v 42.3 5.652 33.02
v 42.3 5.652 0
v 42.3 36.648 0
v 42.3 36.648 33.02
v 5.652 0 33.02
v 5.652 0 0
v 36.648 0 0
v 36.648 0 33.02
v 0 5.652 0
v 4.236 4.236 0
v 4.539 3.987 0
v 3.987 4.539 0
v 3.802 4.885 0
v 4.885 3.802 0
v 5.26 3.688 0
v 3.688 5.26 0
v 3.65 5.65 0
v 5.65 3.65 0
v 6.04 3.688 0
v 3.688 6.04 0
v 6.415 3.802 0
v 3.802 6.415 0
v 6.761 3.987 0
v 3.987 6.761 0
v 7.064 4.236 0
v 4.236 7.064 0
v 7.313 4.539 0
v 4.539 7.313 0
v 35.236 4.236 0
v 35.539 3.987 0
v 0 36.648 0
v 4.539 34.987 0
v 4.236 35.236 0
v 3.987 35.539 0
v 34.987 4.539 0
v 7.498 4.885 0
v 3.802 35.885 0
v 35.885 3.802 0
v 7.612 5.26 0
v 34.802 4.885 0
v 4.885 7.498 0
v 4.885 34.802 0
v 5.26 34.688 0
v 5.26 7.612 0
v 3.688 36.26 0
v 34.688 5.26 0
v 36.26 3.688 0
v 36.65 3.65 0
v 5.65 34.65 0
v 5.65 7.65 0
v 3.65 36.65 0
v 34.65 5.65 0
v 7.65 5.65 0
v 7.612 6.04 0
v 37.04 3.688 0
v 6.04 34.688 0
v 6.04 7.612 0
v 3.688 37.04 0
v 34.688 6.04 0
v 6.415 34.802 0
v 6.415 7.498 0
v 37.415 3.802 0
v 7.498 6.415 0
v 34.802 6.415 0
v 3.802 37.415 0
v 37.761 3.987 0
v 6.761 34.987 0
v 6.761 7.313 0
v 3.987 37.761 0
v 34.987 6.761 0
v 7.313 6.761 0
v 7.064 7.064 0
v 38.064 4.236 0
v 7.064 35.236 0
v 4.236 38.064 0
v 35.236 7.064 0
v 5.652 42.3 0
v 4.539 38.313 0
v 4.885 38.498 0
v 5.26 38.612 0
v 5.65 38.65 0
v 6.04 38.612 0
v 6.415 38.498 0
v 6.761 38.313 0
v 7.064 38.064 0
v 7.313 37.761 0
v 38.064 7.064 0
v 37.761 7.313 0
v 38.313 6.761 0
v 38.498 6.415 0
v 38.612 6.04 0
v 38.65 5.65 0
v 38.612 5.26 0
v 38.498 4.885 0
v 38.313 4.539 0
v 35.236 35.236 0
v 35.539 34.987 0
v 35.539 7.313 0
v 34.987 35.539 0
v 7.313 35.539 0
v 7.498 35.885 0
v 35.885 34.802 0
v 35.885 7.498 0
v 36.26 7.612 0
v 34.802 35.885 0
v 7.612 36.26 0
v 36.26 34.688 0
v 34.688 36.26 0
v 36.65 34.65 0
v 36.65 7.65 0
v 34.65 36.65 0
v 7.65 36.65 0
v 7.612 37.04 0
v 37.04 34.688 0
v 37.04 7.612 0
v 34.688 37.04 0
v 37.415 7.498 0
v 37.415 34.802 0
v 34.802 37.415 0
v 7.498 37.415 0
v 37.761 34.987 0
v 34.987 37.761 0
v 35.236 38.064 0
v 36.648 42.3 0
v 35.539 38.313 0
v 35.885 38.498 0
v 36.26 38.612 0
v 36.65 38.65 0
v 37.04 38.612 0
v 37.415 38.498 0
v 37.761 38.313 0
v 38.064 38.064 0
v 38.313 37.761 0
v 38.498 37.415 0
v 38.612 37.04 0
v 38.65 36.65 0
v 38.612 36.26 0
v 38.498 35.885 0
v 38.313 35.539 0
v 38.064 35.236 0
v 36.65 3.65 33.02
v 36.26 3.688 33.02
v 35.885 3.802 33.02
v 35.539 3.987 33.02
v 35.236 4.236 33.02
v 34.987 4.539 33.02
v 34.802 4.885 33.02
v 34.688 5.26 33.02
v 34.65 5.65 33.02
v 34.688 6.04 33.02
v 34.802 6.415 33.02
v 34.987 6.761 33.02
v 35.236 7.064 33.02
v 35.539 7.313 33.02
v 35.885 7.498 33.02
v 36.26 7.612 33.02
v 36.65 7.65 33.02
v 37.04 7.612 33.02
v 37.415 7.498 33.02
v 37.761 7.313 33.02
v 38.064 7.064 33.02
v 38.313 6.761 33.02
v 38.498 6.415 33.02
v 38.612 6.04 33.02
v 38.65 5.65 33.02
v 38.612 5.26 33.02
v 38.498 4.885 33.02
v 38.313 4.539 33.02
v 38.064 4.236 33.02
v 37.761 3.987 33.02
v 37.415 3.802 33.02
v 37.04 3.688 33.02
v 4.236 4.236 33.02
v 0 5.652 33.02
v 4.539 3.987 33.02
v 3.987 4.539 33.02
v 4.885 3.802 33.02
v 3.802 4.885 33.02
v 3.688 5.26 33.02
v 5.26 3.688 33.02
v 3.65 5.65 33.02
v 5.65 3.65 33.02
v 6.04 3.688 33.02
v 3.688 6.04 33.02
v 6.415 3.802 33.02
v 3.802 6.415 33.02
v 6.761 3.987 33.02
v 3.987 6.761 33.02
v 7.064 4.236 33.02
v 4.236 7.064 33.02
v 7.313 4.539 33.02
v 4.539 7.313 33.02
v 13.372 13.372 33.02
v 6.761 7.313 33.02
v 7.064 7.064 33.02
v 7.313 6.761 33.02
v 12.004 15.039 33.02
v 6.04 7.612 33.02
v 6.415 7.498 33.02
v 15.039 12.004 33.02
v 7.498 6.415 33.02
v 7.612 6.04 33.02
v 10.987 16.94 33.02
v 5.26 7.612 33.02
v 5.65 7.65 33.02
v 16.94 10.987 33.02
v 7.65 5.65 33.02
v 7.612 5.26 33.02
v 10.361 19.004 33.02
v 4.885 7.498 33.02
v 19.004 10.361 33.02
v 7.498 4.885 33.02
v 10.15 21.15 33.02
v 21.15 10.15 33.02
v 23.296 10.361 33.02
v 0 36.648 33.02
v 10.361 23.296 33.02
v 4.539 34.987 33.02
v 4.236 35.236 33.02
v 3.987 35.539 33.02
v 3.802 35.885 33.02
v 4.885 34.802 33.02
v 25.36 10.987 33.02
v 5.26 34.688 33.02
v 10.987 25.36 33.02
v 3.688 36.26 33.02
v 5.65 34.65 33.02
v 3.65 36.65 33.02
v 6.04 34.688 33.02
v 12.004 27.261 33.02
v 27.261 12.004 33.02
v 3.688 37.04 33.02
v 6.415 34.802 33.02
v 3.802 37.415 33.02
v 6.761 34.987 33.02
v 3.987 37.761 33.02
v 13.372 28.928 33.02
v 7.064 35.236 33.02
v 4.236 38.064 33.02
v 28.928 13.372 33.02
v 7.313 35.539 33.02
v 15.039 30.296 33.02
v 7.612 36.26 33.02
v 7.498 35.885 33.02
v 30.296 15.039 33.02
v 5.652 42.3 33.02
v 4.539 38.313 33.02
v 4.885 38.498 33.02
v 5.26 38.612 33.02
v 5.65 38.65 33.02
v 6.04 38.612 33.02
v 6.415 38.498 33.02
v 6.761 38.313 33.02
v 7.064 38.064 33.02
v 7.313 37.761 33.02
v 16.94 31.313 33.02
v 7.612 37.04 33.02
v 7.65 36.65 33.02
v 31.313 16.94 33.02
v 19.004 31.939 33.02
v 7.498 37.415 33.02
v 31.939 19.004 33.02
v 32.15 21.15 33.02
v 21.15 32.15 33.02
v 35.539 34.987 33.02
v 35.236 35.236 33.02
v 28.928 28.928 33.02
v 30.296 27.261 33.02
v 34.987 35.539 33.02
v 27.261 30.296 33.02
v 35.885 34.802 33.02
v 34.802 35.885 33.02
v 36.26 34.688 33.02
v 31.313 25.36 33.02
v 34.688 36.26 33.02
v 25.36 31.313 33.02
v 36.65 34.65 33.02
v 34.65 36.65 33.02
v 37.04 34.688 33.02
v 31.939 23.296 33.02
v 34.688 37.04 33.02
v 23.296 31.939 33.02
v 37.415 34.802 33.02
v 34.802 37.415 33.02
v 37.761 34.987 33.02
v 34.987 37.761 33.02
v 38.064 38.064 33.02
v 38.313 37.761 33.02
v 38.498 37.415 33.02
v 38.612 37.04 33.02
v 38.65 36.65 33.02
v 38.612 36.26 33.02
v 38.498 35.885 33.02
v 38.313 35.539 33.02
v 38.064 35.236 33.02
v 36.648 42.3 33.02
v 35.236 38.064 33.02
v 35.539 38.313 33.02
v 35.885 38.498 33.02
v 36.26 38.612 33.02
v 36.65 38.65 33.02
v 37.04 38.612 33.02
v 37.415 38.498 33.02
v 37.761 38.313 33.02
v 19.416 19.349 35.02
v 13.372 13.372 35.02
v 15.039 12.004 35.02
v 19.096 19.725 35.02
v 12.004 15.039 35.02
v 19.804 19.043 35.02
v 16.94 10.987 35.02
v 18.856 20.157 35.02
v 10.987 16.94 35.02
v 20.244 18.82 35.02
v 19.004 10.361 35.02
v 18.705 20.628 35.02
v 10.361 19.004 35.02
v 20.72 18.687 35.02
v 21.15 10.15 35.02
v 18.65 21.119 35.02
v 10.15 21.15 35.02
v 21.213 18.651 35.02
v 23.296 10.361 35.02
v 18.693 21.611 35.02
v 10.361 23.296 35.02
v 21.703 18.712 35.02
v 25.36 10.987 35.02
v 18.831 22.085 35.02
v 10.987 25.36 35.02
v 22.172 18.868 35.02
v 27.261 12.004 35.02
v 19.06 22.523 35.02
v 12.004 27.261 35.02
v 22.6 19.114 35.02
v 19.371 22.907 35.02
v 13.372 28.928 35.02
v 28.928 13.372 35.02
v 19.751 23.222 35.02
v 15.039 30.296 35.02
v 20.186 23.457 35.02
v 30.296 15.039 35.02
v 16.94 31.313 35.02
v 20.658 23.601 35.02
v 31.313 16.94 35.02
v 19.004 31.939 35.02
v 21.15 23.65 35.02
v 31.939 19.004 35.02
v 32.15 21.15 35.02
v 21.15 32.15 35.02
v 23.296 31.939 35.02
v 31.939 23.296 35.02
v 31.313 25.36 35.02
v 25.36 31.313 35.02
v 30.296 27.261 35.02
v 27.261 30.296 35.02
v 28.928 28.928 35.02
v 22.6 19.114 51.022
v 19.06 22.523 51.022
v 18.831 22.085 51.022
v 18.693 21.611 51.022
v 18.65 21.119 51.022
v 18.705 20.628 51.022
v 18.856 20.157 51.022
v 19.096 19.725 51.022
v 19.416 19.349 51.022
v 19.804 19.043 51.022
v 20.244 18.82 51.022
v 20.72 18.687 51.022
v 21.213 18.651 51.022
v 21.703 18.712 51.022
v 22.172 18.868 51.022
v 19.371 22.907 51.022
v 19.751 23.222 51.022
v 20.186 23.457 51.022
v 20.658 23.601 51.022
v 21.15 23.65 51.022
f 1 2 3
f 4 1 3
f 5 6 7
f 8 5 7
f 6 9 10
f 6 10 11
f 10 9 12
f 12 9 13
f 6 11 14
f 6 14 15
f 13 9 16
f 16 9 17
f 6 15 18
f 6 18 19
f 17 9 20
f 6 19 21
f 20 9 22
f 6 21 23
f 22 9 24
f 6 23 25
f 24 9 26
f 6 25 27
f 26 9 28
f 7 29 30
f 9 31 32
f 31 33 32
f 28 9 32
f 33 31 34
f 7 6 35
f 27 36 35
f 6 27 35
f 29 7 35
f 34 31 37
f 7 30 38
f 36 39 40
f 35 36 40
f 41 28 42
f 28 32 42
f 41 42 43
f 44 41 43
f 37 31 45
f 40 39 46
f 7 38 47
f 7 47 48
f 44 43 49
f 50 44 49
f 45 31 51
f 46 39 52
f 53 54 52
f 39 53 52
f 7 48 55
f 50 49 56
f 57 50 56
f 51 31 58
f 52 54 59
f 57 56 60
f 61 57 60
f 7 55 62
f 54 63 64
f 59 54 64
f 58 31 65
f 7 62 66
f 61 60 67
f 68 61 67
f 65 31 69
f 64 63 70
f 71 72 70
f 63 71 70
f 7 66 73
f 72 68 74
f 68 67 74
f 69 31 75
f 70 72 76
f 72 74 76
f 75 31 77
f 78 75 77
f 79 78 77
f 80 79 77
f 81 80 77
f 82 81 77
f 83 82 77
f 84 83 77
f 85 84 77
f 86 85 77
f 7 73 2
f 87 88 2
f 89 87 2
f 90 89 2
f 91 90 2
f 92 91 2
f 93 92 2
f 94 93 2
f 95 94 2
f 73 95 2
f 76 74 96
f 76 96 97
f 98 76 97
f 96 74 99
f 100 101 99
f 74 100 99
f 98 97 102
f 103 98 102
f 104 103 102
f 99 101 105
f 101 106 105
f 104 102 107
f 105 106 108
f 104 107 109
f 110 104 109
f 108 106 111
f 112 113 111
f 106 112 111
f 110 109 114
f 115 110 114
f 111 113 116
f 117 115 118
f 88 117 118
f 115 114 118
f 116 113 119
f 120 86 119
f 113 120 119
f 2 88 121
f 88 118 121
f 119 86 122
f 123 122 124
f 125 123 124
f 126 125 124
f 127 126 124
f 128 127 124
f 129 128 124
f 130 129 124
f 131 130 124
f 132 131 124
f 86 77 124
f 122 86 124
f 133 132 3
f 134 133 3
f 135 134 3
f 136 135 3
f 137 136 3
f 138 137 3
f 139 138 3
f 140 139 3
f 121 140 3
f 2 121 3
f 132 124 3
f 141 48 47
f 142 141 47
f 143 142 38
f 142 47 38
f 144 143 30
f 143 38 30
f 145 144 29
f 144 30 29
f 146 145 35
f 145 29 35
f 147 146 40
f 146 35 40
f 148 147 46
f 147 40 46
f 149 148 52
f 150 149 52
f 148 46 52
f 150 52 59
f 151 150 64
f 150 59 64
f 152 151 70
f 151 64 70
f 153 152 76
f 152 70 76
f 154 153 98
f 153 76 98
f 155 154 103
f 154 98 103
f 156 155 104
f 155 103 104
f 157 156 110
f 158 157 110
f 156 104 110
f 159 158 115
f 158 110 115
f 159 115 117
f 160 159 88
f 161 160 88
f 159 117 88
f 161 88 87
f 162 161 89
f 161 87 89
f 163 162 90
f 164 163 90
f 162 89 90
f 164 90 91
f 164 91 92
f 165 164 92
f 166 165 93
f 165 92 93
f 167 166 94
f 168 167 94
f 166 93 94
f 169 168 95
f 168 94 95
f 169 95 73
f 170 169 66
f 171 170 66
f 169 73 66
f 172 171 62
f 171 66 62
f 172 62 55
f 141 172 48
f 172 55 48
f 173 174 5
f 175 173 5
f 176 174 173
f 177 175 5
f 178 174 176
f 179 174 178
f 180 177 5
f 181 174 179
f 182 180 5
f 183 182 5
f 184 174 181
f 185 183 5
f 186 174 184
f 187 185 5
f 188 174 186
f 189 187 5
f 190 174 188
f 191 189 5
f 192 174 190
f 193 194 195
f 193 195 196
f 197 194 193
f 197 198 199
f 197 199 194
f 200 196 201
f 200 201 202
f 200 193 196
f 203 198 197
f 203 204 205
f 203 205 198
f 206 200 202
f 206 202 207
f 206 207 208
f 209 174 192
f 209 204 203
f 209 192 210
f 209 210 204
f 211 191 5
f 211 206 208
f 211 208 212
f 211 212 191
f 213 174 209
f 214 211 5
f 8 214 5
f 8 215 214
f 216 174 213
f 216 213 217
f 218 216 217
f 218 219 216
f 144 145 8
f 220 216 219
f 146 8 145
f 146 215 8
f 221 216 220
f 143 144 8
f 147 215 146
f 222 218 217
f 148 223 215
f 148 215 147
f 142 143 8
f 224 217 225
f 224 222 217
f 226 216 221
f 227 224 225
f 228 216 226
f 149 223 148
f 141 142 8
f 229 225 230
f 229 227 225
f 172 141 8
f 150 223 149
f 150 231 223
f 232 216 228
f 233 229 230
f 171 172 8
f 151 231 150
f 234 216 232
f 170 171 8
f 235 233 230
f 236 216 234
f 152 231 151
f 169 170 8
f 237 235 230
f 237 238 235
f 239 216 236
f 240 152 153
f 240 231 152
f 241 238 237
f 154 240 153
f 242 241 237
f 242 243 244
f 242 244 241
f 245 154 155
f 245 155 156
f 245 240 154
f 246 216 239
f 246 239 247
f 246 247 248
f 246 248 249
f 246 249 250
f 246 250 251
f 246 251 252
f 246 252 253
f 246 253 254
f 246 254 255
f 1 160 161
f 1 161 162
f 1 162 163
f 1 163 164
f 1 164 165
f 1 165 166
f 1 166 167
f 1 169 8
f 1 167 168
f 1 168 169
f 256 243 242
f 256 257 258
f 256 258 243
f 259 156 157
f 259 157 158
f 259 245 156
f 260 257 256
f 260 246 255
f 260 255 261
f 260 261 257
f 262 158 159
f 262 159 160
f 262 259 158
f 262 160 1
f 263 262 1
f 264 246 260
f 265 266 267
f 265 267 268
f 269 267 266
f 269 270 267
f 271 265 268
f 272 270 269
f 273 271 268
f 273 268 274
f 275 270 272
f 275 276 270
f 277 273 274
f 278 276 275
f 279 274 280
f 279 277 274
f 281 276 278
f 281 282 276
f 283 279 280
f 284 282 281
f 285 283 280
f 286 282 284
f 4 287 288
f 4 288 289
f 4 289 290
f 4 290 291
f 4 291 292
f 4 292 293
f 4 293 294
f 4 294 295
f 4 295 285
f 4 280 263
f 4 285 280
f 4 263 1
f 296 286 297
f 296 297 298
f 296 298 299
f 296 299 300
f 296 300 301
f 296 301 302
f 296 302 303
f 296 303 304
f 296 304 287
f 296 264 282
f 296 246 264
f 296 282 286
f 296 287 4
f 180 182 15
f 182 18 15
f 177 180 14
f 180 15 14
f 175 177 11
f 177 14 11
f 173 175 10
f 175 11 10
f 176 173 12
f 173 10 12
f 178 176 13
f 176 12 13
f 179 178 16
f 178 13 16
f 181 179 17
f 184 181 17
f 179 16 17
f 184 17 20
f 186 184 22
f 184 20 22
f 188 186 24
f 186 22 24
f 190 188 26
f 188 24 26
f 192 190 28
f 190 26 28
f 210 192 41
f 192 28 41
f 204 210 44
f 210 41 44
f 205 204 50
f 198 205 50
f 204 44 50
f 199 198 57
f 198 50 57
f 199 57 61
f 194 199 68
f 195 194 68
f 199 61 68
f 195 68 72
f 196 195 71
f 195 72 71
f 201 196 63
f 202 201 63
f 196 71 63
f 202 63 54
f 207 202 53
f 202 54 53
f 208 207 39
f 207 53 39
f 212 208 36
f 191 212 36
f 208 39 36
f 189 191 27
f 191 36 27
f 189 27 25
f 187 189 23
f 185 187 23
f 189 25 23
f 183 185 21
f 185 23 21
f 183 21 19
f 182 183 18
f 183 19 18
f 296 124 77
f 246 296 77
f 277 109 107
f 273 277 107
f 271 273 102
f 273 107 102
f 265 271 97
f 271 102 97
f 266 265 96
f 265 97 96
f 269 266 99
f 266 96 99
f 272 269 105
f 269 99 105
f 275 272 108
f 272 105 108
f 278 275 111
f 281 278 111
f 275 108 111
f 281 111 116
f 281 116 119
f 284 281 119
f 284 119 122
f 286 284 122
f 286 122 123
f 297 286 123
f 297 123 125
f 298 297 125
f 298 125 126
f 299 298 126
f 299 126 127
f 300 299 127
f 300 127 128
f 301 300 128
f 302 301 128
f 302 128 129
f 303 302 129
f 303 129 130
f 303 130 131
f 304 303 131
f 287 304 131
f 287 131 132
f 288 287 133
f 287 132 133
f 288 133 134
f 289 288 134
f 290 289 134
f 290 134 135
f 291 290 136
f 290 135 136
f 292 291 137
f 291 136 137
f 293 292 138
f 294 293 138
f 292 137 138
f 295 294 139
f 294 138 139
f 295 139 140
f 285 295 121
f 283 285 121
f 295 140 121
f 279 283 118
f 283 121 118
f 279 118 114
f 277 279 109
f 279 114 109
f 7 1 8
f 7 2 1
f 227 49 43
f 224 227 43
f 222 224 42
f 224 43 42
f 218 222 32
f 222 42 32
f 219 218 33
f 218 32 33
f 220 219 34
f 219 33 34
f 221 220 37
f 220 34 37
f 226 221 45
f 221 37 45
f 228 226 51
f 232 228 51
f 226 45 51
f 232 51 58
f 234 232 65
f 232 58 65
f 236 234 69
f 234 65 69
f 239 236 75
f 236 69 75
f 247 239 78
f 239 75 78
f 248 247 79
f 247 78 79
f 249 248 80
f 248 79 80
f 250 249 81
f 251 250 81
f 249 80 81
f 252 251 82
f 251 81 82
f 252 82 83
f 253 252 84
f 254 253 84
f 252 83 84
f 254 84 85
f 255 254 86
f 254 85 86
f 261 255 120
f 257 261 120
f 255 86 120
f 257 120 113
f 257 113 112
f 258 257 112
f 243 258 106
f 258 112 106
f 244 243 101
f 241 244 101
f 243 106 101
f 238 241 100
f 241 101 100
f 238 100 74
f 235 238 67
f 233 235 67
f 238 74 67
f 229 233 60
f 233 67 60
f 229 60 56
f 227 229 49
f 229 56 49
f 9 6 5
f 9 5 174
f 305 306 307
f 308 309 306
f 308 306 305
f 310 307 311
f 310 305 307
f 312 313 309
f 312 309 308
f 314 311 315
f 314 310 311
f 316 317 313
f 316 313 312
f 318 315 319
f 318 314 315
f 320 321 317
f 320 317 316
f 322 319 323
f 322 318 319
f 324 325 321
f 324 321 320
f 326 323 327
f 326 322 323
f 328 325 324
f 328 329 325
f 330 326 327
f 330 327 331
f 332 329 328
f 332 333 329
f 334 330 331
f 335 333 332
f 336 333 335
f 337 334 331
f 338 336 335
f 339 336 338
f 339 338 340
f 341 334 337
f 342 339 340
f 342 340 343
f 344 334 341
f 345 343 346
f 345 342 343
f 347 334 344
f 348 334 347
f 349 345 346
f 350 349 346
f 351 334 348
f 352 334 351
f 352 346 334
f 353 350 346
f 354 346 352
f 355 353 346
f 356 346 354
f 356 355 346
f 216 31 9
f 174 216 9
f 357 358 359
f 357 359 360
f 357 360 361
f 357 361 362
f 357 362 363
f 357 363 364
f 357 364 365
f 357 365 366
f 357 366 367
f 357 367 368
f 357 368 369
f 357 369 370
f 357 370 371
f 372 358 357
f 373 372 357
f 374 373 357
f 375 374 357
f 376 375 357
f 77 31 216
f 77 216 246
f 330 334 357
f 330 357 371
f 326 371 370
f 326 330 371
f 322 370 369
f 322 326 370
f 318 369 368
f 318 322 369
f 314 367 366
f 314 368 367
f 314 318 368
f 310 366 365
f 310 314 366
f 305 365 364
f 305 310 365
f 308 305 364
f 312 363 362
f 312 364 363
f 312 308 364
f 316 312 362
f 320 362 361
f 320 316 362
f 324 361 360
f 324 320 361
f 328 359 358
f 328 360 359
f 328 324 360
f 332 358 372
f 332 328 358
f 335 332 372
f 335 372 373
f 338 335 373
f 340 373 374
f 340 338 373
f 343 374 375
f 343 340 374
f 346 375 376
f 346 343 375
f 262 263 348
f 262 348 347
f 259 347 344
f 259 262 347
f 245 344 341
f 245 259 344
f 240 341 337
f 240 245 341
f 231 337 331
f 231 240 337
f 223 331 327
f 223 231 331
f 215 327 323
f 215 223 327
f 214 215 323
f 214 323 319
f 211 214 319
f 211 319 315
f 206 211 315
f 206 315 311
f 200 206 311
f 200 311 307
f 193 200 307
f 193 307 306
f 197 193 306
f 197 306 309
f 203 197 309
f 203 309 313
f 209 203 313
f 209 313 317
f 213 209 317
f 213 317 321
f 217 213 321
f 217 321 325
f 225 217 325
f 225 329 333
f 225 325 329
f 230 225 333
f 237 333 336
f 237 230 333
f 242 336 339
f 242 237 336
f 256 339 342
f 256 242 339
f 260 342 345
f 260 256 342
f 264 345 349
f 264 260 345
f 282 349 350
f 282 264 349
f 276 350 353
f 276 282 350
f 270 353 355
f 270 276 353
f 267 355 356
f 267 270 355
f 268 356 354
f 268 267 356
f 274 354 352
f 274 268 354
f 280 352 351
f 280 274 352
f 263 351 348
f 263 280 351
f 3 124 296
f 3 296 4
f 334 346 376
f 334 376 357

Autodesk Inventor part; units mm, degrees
ref_plane "YZ Plane" through (0, 0, 0) normal (1, 0, 0) x (0, 1, 0)
ref_plane "XZ Plane" through (0, 0, 0) normal (0, 1, 0) x (-1, 0, 0)
ref_plane "XY Plane" through (0, 0, 0) normal (0, 0, 1) x (1, 0, 0)
sketch "Sketch1" plane through (0, 0, 0) normal (0, 0, 1) x (1, 0, 0)
  line L0 (5.6515, 0) -> (36.6485, 0)
  line L1 (42.3, 5.6515) -> (42.3, 36.6485)
  line L2 (36.6485, 42.3) -> (5.6515, 42.3)
  line L3 (0, 36.6485) -> (0, 5.6515)
  line L4 (0, 36.6485) -> (5.6515, 42.3)
  line L5 (36.6485, 42.3) -> (42.3, 36.6485)
  line L6 (42.3, 5.6515) -> (36.6485, 0)
  line L7 (5.6515, 0) -> (0, 5.6515)
  line L8 (21.15, 42.3) -> (21.15, 0) construction
  line L9 (0, 21.9578) -> (42.3, 21.9578) construction
  point P0 (0, 0)
  point P1 (42.3, 42.3)
  point P2 (42.3, 0)
  point P3 (0, 42.3)
  dimension "d0" = 42.3
  dimension "d1" = 42.3
  dimension "d2" = 5.6515
  dimension "d3" = 5.6515
  dimension "d4" = 5.6515
  dimension "d5" = 5.6515
  dimension "d6" = 5.6515
  dimension "d7" = 5.6515
  dimension "d8" = 5.6515
  dimension "d9" = 5.6515
  dimension "d10" = 30.997
extrude "Extrusion1" add sketch "Sketch1" along normal blind 33.02
sketch "Sketch2" plane through (0, 0, 33.02) normal (0, 0, 1) x (1, 0, 0)
  line L0 (5.6515, 42.3) -> (36.6485, 42.3) projected
  line L1 (0, 5.6515) -> (0, 36.6485) projected
  line L2 (36.6485, 0) -> (5.6515, 0) projected
  line L3 (42.3, 36.6485) -> (42.3, 5.6515) projected
  line L4 (21.15, 42.3) -> (21.15, 0) construction
  line L5 (0, 21.15) -> (42.3, 21.15) construction
  circle A0 centre (21.15, 21.15) radius 11
  point P0 (0, 0)
  dimension "d13" = 22
extrude "Extrusion2" add sketch "Sketch2" along normal blind 2
sketch "Sketch3" plane through (21.15, 21.15, 35.02) normal (0, 0, 1) x (1, 0, 0)
  circle A0 centre (0, 0) radius 11 projected
  arc A1 (0, 2.5) -> (1.4504, -2.0363) centre (0, 0) ccw
  line L0 (0, 2.5) -> (1.4504, -2.0363)
  point P0 (-21.15, -21.15)
  dimension "d16" = 5
  dimension "d17" = 4.7625
extrude "Extrusion3" add sketch "Sketch3" along normal blind 16.002 contours L0 A1
sketch "Sketch4" plane through (0, 0, 33.02) normal (0, 0, 1) x (1, 0, 0)
  line L0 (0, 36.6485) -> (5.6515, 42.3) projected
  line L1 (5.6515, 0) -> (0, 5.6515) projected
  line L2 (42.3, 5.6515) -> (36.6485, 0) projected
  line L3 (36.6485, 42.3) -> (42.3, 36.6485) projected
  line L4 (2.8258, 39.4742) -> (39.4742, 2.8258) construction
  line L5 (39.4742, 39.4742) -> (2.8257, 2.8258) construction
  point P0 (0, 0)
  point P1 (5.65, 36.65)
  point P2 (36.65, 36.65)
  point P3 (5.65, 5.65)
  point P4 (36.65, 5.65)
  dimension "d20" = 31
  dimension "d21" = 31
  dimension "d22" = 31
  dimension "d23" = 31
hole "Hole1" at (5.65, 36.65, 33.02) at (36.65, 36.65, 33.02) at (5.65, 5.65, 33.02) at (36.65, 5.65, 33.02) direction (0, 0, -1) diameter 4 end through all
equation "\"d3\" = d2"
equation "\"d4\" = d2"
equation "\"d5\" = d4"
equation "\"d6\" = d2"
equation "\"d7\" = d6"
equation "\"d8\" = d2"
equation "\"d9\" = d8"
equation "\"d21\" = d20"
equation "\"d22\" = d20"
equation "\"d23\" = d20"
properties part number "stepper42BYGH007" material "Aluminum-6061"
